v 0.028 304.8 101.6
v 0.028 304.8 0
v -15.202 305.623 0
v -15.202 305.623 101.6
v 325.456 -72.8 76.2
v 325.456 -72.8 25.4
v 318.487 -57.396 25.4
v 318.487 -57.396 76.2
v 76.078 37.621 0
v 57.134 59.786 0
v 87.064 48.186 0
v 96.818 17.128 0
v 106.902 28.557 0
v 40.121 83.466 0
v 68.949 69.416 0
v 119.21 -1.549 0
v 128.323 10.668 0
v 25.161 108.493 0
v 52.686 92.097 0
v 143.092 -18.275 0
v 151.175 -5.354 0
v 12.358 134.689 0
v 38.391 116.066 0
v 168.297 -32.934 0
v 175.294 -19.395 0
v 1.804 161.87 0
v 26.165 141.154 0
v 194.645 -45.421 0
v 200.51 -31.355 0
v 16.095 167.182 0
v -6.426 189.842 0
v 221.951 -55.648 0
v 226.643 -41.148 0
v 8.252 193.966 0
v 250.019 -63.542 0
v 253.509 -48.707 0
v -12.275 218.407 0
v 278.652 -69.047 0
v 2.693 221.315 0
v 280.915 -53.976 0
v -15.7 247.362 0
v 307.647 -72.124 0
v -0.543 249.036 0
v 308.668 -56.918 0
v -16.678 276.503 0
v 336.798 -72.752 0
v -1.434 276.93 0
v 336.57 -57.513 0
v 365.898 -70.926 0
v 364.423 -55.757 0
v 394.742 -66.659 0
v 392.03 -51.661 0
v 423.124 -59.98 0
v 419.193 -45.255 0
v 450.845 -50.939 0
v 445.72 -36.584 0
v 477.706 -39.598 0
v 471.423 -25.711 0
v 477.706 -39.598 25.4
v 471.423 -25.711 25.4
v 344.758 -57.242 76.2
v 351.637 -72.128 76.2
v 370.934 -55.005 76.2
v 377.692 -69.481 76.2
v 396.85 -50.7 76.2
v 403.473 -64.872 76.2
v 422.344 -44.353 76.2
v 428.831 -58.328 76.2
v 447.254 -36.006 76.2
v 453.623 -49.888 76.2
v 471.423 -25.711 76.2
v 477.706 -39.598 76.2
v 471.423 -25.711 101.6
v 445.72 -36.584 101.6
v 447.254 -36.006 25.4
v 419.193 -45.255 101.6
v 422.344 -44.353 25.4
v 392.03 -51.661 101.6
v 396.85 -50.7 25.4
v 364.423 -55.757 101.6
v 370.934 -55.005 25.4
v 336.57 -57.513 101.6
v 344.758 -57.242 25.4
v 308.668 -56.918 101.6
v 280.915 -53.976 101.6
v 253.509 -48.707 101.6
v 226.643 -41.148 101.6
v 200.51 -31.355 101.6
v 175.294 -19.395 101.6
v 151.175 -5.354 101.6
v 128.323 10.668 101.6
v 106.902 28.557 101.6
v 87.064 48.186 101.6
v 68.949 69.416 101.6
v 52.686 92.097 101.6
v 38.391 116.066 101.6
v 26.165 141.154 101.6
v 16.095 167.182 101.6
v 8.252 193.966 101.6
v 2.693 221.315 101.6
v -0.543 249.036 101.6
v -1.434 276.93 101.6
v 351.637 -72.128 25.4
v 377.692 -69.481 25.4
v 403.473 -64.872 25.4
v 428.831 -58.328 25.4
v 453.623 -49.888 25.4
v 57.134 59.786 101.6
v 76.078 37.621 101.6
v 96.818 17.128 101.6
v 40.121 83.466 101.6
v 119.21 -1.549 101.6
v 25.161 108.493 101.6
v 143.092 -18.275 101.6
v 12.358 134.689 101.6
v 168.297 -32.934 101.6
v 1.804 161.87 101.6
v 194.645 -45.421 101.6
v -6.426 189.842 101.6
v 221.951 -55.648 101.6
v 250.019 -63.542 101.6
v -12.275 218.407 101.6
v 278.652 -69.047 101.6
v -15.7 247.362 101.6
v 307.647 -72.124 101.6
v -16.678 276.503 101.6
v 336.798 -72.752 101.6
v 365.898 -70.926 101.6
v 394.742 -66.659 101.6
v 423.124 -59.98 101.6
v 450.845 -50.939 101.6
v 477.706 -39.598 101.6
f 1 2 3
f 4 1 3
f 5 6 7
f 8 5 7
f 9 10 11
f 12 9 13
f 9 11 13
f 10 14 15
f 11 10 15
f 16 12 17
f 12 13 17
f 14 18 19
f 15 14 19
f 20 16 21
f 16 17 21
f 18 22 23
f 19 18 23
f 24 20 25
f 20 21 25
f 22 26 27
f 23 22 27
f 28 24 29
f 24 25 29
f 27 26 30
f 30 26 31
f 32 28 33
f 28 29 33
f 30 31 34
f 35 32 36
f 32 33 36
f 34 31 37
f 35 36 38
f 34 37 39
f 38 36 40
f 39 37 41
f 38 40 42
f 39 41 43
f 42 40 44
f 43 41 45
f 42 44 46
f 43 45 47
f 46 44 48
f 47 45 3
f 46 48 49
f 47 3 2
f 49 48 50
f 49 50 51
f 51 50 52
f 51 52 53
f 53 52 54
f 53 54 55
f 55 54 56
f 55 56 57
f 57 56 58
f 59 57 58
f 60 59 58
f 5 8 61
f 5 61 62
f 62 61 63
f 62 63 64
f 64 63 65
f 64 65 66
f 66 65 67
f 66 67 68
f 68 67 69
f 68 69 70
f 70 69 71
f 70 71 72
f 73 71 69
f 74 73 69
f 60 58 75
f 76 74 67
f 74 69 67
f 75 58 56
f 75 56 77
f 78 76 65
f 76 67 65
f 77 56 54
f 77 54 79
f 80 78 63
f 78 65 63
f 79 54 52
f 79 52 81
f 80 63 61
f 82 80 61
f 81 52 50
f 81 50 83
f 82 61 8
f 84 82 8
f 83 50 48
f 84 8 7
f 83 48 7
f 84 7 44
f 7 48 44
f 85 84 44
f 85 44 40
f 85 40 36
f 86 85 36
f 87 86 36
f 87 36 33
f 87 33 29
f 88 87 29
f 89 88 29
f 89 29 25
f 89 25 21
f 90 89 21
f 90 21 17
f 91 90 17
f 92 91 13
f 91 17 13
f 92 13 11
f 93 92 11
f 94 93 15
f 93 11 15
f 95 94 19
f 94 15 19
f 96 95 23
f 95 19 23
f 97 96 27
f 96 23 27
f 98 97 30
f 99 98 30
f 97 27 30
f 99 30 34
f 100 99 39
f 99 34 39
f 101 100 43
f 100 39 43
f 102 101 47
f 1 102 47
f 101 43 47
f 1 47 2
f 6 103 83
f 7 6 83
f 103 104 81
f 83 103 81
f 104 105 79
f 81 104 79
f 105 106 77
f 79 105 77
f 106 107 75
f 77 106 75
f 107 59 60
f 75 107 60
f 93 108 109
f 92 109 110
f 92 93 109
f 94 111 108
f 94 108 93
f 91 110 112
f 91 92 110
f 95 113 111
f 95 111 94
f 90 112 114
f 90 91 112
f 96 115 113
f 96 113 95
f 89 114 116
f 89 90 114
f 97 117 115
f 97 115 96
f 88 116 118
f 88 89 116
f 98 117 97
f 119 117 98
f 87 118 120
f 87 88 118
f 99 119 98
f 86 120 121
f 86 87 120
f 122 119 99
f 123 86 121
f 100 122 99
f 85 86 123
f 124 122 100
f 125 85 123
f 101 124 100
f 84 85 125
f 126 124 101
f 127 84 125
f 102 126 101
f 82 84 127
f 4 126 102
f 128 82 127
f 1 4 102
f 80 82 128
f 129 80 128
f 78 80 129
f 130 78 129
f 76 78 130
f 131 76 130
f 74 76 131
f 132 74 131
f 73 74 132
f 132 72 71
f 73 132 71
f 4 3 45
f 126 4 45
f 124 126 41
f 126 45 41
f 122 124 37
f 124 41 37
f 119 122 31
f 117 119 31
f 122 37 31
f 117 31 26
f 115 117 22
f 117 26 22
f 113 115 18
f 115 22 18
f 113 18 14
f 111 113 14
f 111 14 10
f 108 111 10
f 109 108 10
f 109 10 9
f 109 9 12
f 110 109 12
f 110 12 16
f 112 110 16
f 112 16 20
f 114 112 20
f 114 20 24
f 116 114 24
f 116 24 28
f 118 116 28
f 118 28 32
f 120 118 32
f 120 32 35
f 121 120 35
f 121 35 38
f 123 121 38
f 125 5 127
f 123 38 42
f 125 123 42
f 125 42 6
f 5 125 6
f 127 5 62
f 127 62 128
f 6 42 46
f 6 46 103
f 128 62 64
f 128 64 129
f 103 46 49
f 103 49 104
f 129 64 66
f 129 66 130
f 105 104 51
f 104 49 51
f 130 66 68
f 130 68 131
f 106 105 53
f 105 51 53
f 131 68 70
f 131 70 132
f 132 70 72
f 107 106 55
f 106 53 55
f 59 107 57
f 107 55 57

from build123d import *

# Parameters (mm, degrees)
F1_DEPTH = 101.6
F3_DEPTH = 152.4


with BuildPart() as f1:
    # F0 (on Top) → F1 (new body)
    with BuildSketch(Plane.XY):
        with BuildLine():
            ThreePointArc((471.423321, -25.710636), (139.580084, 2.415757), (0.027949, 304.8))
            Line((0.027949, 304.8), (-15.201777, 305.623494))
            ThreePointArc((-15.201777, 305.623494), (130.974786, -10.163429), (477.706076, -39.597778))
            Line((477.706076, -39.597778), (471.423321, -25.710636))
        make_face()
    extrude(amount=F1_DEPTH)

    # F2 (on face) → F3 (cut)
    with BuildSketch(Plane(origin=(381.67117, 172.673839, 0), x_dir=(-0.412194, 0.911096, 0), z_dir=(0.911096, 0.412194, 0))):
        Polygon((-139.049853, 76.2), (-316.849853, 76.2), (-316.849853, 25.4), (-232.984855, 25.4), (-139.049853, 25.4), align=None)
    extrude(amount=-F3_DEPTH, mode=Mode.SUBTRACT)


solid = f1.part
